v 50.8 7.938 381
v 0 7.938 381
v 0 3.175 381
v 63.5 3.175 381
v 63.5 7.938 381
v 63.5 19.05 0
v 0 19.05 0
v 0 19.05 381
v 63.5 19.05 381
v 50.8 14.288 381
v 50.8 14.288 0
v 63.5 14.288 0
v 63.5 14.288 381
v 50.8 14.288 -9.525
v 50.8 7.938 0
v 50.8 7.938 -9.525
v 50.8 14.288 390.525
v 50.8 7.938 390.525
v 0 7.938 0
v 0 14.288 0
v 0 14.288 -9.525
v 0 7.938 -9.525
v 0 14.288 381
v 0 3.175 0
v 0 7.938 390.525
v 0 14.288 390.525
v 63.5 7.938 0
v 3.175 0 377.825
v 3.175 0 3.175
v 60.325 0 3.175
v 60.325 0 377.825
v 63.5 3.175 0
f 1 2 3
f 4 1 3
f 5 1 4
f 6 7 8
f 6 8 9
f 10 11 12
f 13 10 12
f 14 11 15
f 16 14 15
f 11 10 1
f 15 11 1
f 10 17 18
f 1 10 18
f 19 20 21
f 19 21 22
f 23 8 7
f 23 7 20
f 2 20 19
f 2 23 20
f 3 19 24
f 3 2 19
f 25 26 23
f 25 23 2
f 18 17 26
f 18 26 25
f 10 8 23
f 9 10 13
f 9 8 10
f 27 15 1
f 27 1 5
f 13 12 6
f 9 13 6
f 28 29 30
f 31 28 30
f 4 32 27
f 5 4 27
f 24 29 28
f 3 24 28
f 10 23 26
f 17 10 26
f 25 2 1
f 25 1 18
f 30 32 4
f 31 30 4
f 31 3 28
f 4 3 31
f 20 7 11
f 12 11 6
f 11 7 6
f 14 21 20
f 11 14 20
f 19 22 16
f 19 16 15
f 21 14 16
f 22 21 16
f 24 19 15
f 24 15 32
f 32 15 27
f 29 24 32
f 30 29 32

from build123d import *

# Parameters (mm, degrees)
F0_W     = 63.5
F0_H     = 19.05
F1_DEPTH = 381
F2_SIZE  = 3.175
F3_W     = 12.7
F3_H     = 6.35
F4_DEPTH = 381.001
F5_W     = 6.35
F5_H     = 9.525
F6_DEPTH = 50.8


with BuildPart() as f1:
    # F0 (on Top) → F1 (new body)
    with BuildSketch(Plane.XY):
        with Locations((31.75, 9.525)):
            Rectangle(F0_W, F0_H)
    extrude(amount=F1_DEPTH)

    # F2
    f2_edges = [f1.edges().sort_by_distance(p)[0] for p in [
        (0, 0, 190.5),
        (63.5, 0, 190.5),
        (31.75, 0, 381),
        (31.75, 0, 0),
    ]]
    chamfer(f2_edges, length=F2_SIZE)

    # F3 (on face) → F4 (cut, through all)
    with BuildSketch(Plane(origin=(0, 0, 0), x_dir=(1, 0, 0), z_dir=(0, 0, -1))):
        with Locations((57.15, -11.1125)):
            Rectangle(F3_W, F3_H)
    extrude(amount=-F4_DEPTH, mode=Mode.SUBTRACT)

    # F5 (on face) → F6 (join)
    with BuildSketch(Plane(origin=(0, 0, 0), x_dir=(0, -1, 0), z_dir=(-1, 0, 0))):
        with Locations((-11.1125, 385.7625)):
            Rectangle(F5_W, F5_H)
        with Locations((-11.1125, -4.7625)):
            Rectangle(F5_W, F5_H)
    extrude(amount=-F6_DEPTH)


solid = f1.part
